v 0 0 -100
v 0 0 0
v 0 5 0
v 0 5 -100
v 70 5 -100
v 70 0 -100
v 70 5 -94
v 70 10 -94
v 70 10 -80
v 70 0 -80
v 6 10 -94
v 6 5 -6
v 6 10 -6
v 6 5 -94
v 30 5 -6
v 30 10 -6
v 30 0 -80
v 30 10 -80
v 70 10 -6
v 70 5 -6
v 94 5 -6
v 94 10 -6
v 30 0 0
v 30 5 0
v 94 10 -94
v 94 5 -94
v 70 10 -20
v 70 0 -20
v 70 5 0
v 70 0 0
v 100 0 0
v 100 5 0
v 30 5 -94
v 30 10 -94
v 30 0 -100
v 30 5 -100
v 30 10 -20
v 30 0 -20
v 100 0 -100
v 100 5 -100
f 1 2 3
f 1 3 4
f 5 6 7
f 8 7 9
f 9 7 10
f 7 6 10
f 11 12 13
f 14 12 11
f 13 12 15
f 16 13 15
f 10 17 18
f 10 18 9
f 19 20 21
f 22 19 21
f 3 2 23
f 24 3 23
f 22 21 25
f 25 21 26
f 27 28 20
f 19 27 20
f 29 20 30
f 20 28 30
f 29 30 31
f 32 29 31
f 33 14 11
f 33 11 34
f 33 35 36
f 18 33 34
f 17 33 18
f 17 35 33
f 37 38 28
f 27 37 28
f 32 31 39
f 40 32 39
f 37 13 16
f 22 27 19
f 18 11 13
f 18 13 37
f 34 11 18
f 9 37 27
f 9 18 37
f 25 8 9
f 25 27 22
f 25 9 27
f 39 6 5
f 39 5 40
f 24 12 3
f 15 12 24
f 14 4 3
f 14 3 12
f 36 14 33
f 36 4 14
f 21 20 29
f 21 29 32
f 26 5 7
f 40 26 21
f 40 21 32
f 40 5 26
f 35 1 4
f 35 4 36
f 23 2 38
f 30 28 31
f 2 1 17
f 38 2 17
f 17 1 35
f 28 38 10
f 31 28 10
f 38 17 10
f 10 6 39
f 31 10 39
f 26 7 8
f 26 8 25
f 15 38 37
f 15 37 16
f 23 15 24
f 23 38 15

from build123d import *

# Parameters (mm, degrees)
SKETCH1_W           = 100
SKETCH1_H           = 100
BOSS_EXTRUDE1_DEPTH = 5
SKETCH2_W           = 88
SKETCH2_H           = 88
BOSS_EXTRUDE2_DEPTH = 5
SKETCH3_W           = 40
SKETCH3_H           = 20
CUT_EXTRUDE1_DEPTH  = 10


with BuildPart() as part:
    # Sketch1 → Boss-Extrude1 (new body)
    with BuildSketch(Plane(origin=(0, 0, 0), x_dir=(1, 0, 0), z_dir=(0, 1, 0))):
        with Locations((50, 50)):
            Rectangle(SKETCH1_W, SKETCH1_H)
    extrude(amount=BOSS_EXTRUDE1_DEPTH)

    # Sketch2 → Boss-Extrude2 (add)
    with BuildSketch(Plane(origin=(0, 5, 0), x_dir=(1, 0, 0), z_dir=(0, 1, 0))):
        with Locations((50, 50)):
            Rectangle(SKETCH2_W, SKETCH2_H)
    extrude(amount=BOSS_EXTRUDE2_DEPTH)

    # Sketch3 → Cut-Extrude1 (cut)
    with BuildSketch(Plane.XZ):
        with Locations((50, -90)):
            Rectangle(SKETCH3_W, SKETCH3_H)
        with Locations((50, -10)):
            Rectangle(SKETCH3_W, SKETCH3_H)
    extrude(amount=-CUT_EXTRUDE1_DEPTH, mode=Mode.SUBTRACT)


solid = part.part
